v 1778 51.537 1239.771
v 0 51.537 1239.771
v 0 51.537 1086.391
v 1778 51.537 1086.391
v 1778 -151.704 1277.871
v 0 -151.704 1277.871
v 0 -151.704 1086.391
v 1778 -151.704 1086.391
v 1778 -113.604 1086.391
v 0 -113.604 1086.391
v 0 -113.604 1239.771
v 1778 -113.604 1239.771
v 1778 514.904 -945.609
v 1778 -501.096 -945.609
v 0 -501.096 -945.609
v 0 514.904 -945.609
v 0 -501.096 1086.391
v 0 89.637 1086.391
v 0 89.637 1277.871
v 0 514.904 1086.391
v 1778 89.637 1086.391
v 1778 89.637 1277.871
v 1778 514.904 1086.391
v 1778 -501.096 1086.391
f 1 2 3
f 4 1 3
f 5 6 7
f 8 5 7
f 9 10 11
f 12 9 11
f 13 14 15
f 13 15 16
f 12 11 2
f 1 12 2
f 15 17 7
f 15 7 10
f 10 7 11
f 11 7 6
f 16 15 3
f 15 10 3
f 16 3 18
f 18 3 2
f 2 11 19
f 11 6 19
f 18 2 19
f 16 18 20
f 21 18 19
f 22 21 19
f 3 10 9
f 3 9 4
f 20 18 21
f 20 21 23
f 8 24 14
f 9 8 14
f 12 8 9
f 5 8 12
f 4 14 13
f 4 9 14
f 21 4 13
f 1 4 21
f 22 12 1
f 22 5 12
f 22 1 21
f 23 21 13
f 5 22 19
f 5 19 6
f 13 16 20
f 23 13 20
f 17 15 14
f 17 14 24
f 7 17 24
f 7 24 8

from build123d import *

# Parameters (mm, degrees)
F0_W     = 1016
F0_H     = 2032
F1_DEPTH = 1778
F3_DEPTH = 1778


with BuildPart() as f1:
    # F0 (on Right) → F1 (new body)
    with BuildSketch(Plane.YZ):
        with Locations((6.904417, 70.391247)):
            Rectangle(F0_W, F0_H)
    extrude(amount=F1_DEPTH)

    # F2 (on face) → F3 (join)
    with BuildSketch(Plane.YZ.offset(1778)):
        Polygon((-151.704185, 1086.391247), (-113.604181, 1086.391247), (-113.604181, 1239.771128), (51.537298, 1239.771128), (51.537298, 1086.391247), (89.637302, 1086.391247), (89.637302, 1277.871132), (-151.704185, 1277.871132), align=None)
    extrude(amount=-F3_DEPTH)


solid = f1.part
